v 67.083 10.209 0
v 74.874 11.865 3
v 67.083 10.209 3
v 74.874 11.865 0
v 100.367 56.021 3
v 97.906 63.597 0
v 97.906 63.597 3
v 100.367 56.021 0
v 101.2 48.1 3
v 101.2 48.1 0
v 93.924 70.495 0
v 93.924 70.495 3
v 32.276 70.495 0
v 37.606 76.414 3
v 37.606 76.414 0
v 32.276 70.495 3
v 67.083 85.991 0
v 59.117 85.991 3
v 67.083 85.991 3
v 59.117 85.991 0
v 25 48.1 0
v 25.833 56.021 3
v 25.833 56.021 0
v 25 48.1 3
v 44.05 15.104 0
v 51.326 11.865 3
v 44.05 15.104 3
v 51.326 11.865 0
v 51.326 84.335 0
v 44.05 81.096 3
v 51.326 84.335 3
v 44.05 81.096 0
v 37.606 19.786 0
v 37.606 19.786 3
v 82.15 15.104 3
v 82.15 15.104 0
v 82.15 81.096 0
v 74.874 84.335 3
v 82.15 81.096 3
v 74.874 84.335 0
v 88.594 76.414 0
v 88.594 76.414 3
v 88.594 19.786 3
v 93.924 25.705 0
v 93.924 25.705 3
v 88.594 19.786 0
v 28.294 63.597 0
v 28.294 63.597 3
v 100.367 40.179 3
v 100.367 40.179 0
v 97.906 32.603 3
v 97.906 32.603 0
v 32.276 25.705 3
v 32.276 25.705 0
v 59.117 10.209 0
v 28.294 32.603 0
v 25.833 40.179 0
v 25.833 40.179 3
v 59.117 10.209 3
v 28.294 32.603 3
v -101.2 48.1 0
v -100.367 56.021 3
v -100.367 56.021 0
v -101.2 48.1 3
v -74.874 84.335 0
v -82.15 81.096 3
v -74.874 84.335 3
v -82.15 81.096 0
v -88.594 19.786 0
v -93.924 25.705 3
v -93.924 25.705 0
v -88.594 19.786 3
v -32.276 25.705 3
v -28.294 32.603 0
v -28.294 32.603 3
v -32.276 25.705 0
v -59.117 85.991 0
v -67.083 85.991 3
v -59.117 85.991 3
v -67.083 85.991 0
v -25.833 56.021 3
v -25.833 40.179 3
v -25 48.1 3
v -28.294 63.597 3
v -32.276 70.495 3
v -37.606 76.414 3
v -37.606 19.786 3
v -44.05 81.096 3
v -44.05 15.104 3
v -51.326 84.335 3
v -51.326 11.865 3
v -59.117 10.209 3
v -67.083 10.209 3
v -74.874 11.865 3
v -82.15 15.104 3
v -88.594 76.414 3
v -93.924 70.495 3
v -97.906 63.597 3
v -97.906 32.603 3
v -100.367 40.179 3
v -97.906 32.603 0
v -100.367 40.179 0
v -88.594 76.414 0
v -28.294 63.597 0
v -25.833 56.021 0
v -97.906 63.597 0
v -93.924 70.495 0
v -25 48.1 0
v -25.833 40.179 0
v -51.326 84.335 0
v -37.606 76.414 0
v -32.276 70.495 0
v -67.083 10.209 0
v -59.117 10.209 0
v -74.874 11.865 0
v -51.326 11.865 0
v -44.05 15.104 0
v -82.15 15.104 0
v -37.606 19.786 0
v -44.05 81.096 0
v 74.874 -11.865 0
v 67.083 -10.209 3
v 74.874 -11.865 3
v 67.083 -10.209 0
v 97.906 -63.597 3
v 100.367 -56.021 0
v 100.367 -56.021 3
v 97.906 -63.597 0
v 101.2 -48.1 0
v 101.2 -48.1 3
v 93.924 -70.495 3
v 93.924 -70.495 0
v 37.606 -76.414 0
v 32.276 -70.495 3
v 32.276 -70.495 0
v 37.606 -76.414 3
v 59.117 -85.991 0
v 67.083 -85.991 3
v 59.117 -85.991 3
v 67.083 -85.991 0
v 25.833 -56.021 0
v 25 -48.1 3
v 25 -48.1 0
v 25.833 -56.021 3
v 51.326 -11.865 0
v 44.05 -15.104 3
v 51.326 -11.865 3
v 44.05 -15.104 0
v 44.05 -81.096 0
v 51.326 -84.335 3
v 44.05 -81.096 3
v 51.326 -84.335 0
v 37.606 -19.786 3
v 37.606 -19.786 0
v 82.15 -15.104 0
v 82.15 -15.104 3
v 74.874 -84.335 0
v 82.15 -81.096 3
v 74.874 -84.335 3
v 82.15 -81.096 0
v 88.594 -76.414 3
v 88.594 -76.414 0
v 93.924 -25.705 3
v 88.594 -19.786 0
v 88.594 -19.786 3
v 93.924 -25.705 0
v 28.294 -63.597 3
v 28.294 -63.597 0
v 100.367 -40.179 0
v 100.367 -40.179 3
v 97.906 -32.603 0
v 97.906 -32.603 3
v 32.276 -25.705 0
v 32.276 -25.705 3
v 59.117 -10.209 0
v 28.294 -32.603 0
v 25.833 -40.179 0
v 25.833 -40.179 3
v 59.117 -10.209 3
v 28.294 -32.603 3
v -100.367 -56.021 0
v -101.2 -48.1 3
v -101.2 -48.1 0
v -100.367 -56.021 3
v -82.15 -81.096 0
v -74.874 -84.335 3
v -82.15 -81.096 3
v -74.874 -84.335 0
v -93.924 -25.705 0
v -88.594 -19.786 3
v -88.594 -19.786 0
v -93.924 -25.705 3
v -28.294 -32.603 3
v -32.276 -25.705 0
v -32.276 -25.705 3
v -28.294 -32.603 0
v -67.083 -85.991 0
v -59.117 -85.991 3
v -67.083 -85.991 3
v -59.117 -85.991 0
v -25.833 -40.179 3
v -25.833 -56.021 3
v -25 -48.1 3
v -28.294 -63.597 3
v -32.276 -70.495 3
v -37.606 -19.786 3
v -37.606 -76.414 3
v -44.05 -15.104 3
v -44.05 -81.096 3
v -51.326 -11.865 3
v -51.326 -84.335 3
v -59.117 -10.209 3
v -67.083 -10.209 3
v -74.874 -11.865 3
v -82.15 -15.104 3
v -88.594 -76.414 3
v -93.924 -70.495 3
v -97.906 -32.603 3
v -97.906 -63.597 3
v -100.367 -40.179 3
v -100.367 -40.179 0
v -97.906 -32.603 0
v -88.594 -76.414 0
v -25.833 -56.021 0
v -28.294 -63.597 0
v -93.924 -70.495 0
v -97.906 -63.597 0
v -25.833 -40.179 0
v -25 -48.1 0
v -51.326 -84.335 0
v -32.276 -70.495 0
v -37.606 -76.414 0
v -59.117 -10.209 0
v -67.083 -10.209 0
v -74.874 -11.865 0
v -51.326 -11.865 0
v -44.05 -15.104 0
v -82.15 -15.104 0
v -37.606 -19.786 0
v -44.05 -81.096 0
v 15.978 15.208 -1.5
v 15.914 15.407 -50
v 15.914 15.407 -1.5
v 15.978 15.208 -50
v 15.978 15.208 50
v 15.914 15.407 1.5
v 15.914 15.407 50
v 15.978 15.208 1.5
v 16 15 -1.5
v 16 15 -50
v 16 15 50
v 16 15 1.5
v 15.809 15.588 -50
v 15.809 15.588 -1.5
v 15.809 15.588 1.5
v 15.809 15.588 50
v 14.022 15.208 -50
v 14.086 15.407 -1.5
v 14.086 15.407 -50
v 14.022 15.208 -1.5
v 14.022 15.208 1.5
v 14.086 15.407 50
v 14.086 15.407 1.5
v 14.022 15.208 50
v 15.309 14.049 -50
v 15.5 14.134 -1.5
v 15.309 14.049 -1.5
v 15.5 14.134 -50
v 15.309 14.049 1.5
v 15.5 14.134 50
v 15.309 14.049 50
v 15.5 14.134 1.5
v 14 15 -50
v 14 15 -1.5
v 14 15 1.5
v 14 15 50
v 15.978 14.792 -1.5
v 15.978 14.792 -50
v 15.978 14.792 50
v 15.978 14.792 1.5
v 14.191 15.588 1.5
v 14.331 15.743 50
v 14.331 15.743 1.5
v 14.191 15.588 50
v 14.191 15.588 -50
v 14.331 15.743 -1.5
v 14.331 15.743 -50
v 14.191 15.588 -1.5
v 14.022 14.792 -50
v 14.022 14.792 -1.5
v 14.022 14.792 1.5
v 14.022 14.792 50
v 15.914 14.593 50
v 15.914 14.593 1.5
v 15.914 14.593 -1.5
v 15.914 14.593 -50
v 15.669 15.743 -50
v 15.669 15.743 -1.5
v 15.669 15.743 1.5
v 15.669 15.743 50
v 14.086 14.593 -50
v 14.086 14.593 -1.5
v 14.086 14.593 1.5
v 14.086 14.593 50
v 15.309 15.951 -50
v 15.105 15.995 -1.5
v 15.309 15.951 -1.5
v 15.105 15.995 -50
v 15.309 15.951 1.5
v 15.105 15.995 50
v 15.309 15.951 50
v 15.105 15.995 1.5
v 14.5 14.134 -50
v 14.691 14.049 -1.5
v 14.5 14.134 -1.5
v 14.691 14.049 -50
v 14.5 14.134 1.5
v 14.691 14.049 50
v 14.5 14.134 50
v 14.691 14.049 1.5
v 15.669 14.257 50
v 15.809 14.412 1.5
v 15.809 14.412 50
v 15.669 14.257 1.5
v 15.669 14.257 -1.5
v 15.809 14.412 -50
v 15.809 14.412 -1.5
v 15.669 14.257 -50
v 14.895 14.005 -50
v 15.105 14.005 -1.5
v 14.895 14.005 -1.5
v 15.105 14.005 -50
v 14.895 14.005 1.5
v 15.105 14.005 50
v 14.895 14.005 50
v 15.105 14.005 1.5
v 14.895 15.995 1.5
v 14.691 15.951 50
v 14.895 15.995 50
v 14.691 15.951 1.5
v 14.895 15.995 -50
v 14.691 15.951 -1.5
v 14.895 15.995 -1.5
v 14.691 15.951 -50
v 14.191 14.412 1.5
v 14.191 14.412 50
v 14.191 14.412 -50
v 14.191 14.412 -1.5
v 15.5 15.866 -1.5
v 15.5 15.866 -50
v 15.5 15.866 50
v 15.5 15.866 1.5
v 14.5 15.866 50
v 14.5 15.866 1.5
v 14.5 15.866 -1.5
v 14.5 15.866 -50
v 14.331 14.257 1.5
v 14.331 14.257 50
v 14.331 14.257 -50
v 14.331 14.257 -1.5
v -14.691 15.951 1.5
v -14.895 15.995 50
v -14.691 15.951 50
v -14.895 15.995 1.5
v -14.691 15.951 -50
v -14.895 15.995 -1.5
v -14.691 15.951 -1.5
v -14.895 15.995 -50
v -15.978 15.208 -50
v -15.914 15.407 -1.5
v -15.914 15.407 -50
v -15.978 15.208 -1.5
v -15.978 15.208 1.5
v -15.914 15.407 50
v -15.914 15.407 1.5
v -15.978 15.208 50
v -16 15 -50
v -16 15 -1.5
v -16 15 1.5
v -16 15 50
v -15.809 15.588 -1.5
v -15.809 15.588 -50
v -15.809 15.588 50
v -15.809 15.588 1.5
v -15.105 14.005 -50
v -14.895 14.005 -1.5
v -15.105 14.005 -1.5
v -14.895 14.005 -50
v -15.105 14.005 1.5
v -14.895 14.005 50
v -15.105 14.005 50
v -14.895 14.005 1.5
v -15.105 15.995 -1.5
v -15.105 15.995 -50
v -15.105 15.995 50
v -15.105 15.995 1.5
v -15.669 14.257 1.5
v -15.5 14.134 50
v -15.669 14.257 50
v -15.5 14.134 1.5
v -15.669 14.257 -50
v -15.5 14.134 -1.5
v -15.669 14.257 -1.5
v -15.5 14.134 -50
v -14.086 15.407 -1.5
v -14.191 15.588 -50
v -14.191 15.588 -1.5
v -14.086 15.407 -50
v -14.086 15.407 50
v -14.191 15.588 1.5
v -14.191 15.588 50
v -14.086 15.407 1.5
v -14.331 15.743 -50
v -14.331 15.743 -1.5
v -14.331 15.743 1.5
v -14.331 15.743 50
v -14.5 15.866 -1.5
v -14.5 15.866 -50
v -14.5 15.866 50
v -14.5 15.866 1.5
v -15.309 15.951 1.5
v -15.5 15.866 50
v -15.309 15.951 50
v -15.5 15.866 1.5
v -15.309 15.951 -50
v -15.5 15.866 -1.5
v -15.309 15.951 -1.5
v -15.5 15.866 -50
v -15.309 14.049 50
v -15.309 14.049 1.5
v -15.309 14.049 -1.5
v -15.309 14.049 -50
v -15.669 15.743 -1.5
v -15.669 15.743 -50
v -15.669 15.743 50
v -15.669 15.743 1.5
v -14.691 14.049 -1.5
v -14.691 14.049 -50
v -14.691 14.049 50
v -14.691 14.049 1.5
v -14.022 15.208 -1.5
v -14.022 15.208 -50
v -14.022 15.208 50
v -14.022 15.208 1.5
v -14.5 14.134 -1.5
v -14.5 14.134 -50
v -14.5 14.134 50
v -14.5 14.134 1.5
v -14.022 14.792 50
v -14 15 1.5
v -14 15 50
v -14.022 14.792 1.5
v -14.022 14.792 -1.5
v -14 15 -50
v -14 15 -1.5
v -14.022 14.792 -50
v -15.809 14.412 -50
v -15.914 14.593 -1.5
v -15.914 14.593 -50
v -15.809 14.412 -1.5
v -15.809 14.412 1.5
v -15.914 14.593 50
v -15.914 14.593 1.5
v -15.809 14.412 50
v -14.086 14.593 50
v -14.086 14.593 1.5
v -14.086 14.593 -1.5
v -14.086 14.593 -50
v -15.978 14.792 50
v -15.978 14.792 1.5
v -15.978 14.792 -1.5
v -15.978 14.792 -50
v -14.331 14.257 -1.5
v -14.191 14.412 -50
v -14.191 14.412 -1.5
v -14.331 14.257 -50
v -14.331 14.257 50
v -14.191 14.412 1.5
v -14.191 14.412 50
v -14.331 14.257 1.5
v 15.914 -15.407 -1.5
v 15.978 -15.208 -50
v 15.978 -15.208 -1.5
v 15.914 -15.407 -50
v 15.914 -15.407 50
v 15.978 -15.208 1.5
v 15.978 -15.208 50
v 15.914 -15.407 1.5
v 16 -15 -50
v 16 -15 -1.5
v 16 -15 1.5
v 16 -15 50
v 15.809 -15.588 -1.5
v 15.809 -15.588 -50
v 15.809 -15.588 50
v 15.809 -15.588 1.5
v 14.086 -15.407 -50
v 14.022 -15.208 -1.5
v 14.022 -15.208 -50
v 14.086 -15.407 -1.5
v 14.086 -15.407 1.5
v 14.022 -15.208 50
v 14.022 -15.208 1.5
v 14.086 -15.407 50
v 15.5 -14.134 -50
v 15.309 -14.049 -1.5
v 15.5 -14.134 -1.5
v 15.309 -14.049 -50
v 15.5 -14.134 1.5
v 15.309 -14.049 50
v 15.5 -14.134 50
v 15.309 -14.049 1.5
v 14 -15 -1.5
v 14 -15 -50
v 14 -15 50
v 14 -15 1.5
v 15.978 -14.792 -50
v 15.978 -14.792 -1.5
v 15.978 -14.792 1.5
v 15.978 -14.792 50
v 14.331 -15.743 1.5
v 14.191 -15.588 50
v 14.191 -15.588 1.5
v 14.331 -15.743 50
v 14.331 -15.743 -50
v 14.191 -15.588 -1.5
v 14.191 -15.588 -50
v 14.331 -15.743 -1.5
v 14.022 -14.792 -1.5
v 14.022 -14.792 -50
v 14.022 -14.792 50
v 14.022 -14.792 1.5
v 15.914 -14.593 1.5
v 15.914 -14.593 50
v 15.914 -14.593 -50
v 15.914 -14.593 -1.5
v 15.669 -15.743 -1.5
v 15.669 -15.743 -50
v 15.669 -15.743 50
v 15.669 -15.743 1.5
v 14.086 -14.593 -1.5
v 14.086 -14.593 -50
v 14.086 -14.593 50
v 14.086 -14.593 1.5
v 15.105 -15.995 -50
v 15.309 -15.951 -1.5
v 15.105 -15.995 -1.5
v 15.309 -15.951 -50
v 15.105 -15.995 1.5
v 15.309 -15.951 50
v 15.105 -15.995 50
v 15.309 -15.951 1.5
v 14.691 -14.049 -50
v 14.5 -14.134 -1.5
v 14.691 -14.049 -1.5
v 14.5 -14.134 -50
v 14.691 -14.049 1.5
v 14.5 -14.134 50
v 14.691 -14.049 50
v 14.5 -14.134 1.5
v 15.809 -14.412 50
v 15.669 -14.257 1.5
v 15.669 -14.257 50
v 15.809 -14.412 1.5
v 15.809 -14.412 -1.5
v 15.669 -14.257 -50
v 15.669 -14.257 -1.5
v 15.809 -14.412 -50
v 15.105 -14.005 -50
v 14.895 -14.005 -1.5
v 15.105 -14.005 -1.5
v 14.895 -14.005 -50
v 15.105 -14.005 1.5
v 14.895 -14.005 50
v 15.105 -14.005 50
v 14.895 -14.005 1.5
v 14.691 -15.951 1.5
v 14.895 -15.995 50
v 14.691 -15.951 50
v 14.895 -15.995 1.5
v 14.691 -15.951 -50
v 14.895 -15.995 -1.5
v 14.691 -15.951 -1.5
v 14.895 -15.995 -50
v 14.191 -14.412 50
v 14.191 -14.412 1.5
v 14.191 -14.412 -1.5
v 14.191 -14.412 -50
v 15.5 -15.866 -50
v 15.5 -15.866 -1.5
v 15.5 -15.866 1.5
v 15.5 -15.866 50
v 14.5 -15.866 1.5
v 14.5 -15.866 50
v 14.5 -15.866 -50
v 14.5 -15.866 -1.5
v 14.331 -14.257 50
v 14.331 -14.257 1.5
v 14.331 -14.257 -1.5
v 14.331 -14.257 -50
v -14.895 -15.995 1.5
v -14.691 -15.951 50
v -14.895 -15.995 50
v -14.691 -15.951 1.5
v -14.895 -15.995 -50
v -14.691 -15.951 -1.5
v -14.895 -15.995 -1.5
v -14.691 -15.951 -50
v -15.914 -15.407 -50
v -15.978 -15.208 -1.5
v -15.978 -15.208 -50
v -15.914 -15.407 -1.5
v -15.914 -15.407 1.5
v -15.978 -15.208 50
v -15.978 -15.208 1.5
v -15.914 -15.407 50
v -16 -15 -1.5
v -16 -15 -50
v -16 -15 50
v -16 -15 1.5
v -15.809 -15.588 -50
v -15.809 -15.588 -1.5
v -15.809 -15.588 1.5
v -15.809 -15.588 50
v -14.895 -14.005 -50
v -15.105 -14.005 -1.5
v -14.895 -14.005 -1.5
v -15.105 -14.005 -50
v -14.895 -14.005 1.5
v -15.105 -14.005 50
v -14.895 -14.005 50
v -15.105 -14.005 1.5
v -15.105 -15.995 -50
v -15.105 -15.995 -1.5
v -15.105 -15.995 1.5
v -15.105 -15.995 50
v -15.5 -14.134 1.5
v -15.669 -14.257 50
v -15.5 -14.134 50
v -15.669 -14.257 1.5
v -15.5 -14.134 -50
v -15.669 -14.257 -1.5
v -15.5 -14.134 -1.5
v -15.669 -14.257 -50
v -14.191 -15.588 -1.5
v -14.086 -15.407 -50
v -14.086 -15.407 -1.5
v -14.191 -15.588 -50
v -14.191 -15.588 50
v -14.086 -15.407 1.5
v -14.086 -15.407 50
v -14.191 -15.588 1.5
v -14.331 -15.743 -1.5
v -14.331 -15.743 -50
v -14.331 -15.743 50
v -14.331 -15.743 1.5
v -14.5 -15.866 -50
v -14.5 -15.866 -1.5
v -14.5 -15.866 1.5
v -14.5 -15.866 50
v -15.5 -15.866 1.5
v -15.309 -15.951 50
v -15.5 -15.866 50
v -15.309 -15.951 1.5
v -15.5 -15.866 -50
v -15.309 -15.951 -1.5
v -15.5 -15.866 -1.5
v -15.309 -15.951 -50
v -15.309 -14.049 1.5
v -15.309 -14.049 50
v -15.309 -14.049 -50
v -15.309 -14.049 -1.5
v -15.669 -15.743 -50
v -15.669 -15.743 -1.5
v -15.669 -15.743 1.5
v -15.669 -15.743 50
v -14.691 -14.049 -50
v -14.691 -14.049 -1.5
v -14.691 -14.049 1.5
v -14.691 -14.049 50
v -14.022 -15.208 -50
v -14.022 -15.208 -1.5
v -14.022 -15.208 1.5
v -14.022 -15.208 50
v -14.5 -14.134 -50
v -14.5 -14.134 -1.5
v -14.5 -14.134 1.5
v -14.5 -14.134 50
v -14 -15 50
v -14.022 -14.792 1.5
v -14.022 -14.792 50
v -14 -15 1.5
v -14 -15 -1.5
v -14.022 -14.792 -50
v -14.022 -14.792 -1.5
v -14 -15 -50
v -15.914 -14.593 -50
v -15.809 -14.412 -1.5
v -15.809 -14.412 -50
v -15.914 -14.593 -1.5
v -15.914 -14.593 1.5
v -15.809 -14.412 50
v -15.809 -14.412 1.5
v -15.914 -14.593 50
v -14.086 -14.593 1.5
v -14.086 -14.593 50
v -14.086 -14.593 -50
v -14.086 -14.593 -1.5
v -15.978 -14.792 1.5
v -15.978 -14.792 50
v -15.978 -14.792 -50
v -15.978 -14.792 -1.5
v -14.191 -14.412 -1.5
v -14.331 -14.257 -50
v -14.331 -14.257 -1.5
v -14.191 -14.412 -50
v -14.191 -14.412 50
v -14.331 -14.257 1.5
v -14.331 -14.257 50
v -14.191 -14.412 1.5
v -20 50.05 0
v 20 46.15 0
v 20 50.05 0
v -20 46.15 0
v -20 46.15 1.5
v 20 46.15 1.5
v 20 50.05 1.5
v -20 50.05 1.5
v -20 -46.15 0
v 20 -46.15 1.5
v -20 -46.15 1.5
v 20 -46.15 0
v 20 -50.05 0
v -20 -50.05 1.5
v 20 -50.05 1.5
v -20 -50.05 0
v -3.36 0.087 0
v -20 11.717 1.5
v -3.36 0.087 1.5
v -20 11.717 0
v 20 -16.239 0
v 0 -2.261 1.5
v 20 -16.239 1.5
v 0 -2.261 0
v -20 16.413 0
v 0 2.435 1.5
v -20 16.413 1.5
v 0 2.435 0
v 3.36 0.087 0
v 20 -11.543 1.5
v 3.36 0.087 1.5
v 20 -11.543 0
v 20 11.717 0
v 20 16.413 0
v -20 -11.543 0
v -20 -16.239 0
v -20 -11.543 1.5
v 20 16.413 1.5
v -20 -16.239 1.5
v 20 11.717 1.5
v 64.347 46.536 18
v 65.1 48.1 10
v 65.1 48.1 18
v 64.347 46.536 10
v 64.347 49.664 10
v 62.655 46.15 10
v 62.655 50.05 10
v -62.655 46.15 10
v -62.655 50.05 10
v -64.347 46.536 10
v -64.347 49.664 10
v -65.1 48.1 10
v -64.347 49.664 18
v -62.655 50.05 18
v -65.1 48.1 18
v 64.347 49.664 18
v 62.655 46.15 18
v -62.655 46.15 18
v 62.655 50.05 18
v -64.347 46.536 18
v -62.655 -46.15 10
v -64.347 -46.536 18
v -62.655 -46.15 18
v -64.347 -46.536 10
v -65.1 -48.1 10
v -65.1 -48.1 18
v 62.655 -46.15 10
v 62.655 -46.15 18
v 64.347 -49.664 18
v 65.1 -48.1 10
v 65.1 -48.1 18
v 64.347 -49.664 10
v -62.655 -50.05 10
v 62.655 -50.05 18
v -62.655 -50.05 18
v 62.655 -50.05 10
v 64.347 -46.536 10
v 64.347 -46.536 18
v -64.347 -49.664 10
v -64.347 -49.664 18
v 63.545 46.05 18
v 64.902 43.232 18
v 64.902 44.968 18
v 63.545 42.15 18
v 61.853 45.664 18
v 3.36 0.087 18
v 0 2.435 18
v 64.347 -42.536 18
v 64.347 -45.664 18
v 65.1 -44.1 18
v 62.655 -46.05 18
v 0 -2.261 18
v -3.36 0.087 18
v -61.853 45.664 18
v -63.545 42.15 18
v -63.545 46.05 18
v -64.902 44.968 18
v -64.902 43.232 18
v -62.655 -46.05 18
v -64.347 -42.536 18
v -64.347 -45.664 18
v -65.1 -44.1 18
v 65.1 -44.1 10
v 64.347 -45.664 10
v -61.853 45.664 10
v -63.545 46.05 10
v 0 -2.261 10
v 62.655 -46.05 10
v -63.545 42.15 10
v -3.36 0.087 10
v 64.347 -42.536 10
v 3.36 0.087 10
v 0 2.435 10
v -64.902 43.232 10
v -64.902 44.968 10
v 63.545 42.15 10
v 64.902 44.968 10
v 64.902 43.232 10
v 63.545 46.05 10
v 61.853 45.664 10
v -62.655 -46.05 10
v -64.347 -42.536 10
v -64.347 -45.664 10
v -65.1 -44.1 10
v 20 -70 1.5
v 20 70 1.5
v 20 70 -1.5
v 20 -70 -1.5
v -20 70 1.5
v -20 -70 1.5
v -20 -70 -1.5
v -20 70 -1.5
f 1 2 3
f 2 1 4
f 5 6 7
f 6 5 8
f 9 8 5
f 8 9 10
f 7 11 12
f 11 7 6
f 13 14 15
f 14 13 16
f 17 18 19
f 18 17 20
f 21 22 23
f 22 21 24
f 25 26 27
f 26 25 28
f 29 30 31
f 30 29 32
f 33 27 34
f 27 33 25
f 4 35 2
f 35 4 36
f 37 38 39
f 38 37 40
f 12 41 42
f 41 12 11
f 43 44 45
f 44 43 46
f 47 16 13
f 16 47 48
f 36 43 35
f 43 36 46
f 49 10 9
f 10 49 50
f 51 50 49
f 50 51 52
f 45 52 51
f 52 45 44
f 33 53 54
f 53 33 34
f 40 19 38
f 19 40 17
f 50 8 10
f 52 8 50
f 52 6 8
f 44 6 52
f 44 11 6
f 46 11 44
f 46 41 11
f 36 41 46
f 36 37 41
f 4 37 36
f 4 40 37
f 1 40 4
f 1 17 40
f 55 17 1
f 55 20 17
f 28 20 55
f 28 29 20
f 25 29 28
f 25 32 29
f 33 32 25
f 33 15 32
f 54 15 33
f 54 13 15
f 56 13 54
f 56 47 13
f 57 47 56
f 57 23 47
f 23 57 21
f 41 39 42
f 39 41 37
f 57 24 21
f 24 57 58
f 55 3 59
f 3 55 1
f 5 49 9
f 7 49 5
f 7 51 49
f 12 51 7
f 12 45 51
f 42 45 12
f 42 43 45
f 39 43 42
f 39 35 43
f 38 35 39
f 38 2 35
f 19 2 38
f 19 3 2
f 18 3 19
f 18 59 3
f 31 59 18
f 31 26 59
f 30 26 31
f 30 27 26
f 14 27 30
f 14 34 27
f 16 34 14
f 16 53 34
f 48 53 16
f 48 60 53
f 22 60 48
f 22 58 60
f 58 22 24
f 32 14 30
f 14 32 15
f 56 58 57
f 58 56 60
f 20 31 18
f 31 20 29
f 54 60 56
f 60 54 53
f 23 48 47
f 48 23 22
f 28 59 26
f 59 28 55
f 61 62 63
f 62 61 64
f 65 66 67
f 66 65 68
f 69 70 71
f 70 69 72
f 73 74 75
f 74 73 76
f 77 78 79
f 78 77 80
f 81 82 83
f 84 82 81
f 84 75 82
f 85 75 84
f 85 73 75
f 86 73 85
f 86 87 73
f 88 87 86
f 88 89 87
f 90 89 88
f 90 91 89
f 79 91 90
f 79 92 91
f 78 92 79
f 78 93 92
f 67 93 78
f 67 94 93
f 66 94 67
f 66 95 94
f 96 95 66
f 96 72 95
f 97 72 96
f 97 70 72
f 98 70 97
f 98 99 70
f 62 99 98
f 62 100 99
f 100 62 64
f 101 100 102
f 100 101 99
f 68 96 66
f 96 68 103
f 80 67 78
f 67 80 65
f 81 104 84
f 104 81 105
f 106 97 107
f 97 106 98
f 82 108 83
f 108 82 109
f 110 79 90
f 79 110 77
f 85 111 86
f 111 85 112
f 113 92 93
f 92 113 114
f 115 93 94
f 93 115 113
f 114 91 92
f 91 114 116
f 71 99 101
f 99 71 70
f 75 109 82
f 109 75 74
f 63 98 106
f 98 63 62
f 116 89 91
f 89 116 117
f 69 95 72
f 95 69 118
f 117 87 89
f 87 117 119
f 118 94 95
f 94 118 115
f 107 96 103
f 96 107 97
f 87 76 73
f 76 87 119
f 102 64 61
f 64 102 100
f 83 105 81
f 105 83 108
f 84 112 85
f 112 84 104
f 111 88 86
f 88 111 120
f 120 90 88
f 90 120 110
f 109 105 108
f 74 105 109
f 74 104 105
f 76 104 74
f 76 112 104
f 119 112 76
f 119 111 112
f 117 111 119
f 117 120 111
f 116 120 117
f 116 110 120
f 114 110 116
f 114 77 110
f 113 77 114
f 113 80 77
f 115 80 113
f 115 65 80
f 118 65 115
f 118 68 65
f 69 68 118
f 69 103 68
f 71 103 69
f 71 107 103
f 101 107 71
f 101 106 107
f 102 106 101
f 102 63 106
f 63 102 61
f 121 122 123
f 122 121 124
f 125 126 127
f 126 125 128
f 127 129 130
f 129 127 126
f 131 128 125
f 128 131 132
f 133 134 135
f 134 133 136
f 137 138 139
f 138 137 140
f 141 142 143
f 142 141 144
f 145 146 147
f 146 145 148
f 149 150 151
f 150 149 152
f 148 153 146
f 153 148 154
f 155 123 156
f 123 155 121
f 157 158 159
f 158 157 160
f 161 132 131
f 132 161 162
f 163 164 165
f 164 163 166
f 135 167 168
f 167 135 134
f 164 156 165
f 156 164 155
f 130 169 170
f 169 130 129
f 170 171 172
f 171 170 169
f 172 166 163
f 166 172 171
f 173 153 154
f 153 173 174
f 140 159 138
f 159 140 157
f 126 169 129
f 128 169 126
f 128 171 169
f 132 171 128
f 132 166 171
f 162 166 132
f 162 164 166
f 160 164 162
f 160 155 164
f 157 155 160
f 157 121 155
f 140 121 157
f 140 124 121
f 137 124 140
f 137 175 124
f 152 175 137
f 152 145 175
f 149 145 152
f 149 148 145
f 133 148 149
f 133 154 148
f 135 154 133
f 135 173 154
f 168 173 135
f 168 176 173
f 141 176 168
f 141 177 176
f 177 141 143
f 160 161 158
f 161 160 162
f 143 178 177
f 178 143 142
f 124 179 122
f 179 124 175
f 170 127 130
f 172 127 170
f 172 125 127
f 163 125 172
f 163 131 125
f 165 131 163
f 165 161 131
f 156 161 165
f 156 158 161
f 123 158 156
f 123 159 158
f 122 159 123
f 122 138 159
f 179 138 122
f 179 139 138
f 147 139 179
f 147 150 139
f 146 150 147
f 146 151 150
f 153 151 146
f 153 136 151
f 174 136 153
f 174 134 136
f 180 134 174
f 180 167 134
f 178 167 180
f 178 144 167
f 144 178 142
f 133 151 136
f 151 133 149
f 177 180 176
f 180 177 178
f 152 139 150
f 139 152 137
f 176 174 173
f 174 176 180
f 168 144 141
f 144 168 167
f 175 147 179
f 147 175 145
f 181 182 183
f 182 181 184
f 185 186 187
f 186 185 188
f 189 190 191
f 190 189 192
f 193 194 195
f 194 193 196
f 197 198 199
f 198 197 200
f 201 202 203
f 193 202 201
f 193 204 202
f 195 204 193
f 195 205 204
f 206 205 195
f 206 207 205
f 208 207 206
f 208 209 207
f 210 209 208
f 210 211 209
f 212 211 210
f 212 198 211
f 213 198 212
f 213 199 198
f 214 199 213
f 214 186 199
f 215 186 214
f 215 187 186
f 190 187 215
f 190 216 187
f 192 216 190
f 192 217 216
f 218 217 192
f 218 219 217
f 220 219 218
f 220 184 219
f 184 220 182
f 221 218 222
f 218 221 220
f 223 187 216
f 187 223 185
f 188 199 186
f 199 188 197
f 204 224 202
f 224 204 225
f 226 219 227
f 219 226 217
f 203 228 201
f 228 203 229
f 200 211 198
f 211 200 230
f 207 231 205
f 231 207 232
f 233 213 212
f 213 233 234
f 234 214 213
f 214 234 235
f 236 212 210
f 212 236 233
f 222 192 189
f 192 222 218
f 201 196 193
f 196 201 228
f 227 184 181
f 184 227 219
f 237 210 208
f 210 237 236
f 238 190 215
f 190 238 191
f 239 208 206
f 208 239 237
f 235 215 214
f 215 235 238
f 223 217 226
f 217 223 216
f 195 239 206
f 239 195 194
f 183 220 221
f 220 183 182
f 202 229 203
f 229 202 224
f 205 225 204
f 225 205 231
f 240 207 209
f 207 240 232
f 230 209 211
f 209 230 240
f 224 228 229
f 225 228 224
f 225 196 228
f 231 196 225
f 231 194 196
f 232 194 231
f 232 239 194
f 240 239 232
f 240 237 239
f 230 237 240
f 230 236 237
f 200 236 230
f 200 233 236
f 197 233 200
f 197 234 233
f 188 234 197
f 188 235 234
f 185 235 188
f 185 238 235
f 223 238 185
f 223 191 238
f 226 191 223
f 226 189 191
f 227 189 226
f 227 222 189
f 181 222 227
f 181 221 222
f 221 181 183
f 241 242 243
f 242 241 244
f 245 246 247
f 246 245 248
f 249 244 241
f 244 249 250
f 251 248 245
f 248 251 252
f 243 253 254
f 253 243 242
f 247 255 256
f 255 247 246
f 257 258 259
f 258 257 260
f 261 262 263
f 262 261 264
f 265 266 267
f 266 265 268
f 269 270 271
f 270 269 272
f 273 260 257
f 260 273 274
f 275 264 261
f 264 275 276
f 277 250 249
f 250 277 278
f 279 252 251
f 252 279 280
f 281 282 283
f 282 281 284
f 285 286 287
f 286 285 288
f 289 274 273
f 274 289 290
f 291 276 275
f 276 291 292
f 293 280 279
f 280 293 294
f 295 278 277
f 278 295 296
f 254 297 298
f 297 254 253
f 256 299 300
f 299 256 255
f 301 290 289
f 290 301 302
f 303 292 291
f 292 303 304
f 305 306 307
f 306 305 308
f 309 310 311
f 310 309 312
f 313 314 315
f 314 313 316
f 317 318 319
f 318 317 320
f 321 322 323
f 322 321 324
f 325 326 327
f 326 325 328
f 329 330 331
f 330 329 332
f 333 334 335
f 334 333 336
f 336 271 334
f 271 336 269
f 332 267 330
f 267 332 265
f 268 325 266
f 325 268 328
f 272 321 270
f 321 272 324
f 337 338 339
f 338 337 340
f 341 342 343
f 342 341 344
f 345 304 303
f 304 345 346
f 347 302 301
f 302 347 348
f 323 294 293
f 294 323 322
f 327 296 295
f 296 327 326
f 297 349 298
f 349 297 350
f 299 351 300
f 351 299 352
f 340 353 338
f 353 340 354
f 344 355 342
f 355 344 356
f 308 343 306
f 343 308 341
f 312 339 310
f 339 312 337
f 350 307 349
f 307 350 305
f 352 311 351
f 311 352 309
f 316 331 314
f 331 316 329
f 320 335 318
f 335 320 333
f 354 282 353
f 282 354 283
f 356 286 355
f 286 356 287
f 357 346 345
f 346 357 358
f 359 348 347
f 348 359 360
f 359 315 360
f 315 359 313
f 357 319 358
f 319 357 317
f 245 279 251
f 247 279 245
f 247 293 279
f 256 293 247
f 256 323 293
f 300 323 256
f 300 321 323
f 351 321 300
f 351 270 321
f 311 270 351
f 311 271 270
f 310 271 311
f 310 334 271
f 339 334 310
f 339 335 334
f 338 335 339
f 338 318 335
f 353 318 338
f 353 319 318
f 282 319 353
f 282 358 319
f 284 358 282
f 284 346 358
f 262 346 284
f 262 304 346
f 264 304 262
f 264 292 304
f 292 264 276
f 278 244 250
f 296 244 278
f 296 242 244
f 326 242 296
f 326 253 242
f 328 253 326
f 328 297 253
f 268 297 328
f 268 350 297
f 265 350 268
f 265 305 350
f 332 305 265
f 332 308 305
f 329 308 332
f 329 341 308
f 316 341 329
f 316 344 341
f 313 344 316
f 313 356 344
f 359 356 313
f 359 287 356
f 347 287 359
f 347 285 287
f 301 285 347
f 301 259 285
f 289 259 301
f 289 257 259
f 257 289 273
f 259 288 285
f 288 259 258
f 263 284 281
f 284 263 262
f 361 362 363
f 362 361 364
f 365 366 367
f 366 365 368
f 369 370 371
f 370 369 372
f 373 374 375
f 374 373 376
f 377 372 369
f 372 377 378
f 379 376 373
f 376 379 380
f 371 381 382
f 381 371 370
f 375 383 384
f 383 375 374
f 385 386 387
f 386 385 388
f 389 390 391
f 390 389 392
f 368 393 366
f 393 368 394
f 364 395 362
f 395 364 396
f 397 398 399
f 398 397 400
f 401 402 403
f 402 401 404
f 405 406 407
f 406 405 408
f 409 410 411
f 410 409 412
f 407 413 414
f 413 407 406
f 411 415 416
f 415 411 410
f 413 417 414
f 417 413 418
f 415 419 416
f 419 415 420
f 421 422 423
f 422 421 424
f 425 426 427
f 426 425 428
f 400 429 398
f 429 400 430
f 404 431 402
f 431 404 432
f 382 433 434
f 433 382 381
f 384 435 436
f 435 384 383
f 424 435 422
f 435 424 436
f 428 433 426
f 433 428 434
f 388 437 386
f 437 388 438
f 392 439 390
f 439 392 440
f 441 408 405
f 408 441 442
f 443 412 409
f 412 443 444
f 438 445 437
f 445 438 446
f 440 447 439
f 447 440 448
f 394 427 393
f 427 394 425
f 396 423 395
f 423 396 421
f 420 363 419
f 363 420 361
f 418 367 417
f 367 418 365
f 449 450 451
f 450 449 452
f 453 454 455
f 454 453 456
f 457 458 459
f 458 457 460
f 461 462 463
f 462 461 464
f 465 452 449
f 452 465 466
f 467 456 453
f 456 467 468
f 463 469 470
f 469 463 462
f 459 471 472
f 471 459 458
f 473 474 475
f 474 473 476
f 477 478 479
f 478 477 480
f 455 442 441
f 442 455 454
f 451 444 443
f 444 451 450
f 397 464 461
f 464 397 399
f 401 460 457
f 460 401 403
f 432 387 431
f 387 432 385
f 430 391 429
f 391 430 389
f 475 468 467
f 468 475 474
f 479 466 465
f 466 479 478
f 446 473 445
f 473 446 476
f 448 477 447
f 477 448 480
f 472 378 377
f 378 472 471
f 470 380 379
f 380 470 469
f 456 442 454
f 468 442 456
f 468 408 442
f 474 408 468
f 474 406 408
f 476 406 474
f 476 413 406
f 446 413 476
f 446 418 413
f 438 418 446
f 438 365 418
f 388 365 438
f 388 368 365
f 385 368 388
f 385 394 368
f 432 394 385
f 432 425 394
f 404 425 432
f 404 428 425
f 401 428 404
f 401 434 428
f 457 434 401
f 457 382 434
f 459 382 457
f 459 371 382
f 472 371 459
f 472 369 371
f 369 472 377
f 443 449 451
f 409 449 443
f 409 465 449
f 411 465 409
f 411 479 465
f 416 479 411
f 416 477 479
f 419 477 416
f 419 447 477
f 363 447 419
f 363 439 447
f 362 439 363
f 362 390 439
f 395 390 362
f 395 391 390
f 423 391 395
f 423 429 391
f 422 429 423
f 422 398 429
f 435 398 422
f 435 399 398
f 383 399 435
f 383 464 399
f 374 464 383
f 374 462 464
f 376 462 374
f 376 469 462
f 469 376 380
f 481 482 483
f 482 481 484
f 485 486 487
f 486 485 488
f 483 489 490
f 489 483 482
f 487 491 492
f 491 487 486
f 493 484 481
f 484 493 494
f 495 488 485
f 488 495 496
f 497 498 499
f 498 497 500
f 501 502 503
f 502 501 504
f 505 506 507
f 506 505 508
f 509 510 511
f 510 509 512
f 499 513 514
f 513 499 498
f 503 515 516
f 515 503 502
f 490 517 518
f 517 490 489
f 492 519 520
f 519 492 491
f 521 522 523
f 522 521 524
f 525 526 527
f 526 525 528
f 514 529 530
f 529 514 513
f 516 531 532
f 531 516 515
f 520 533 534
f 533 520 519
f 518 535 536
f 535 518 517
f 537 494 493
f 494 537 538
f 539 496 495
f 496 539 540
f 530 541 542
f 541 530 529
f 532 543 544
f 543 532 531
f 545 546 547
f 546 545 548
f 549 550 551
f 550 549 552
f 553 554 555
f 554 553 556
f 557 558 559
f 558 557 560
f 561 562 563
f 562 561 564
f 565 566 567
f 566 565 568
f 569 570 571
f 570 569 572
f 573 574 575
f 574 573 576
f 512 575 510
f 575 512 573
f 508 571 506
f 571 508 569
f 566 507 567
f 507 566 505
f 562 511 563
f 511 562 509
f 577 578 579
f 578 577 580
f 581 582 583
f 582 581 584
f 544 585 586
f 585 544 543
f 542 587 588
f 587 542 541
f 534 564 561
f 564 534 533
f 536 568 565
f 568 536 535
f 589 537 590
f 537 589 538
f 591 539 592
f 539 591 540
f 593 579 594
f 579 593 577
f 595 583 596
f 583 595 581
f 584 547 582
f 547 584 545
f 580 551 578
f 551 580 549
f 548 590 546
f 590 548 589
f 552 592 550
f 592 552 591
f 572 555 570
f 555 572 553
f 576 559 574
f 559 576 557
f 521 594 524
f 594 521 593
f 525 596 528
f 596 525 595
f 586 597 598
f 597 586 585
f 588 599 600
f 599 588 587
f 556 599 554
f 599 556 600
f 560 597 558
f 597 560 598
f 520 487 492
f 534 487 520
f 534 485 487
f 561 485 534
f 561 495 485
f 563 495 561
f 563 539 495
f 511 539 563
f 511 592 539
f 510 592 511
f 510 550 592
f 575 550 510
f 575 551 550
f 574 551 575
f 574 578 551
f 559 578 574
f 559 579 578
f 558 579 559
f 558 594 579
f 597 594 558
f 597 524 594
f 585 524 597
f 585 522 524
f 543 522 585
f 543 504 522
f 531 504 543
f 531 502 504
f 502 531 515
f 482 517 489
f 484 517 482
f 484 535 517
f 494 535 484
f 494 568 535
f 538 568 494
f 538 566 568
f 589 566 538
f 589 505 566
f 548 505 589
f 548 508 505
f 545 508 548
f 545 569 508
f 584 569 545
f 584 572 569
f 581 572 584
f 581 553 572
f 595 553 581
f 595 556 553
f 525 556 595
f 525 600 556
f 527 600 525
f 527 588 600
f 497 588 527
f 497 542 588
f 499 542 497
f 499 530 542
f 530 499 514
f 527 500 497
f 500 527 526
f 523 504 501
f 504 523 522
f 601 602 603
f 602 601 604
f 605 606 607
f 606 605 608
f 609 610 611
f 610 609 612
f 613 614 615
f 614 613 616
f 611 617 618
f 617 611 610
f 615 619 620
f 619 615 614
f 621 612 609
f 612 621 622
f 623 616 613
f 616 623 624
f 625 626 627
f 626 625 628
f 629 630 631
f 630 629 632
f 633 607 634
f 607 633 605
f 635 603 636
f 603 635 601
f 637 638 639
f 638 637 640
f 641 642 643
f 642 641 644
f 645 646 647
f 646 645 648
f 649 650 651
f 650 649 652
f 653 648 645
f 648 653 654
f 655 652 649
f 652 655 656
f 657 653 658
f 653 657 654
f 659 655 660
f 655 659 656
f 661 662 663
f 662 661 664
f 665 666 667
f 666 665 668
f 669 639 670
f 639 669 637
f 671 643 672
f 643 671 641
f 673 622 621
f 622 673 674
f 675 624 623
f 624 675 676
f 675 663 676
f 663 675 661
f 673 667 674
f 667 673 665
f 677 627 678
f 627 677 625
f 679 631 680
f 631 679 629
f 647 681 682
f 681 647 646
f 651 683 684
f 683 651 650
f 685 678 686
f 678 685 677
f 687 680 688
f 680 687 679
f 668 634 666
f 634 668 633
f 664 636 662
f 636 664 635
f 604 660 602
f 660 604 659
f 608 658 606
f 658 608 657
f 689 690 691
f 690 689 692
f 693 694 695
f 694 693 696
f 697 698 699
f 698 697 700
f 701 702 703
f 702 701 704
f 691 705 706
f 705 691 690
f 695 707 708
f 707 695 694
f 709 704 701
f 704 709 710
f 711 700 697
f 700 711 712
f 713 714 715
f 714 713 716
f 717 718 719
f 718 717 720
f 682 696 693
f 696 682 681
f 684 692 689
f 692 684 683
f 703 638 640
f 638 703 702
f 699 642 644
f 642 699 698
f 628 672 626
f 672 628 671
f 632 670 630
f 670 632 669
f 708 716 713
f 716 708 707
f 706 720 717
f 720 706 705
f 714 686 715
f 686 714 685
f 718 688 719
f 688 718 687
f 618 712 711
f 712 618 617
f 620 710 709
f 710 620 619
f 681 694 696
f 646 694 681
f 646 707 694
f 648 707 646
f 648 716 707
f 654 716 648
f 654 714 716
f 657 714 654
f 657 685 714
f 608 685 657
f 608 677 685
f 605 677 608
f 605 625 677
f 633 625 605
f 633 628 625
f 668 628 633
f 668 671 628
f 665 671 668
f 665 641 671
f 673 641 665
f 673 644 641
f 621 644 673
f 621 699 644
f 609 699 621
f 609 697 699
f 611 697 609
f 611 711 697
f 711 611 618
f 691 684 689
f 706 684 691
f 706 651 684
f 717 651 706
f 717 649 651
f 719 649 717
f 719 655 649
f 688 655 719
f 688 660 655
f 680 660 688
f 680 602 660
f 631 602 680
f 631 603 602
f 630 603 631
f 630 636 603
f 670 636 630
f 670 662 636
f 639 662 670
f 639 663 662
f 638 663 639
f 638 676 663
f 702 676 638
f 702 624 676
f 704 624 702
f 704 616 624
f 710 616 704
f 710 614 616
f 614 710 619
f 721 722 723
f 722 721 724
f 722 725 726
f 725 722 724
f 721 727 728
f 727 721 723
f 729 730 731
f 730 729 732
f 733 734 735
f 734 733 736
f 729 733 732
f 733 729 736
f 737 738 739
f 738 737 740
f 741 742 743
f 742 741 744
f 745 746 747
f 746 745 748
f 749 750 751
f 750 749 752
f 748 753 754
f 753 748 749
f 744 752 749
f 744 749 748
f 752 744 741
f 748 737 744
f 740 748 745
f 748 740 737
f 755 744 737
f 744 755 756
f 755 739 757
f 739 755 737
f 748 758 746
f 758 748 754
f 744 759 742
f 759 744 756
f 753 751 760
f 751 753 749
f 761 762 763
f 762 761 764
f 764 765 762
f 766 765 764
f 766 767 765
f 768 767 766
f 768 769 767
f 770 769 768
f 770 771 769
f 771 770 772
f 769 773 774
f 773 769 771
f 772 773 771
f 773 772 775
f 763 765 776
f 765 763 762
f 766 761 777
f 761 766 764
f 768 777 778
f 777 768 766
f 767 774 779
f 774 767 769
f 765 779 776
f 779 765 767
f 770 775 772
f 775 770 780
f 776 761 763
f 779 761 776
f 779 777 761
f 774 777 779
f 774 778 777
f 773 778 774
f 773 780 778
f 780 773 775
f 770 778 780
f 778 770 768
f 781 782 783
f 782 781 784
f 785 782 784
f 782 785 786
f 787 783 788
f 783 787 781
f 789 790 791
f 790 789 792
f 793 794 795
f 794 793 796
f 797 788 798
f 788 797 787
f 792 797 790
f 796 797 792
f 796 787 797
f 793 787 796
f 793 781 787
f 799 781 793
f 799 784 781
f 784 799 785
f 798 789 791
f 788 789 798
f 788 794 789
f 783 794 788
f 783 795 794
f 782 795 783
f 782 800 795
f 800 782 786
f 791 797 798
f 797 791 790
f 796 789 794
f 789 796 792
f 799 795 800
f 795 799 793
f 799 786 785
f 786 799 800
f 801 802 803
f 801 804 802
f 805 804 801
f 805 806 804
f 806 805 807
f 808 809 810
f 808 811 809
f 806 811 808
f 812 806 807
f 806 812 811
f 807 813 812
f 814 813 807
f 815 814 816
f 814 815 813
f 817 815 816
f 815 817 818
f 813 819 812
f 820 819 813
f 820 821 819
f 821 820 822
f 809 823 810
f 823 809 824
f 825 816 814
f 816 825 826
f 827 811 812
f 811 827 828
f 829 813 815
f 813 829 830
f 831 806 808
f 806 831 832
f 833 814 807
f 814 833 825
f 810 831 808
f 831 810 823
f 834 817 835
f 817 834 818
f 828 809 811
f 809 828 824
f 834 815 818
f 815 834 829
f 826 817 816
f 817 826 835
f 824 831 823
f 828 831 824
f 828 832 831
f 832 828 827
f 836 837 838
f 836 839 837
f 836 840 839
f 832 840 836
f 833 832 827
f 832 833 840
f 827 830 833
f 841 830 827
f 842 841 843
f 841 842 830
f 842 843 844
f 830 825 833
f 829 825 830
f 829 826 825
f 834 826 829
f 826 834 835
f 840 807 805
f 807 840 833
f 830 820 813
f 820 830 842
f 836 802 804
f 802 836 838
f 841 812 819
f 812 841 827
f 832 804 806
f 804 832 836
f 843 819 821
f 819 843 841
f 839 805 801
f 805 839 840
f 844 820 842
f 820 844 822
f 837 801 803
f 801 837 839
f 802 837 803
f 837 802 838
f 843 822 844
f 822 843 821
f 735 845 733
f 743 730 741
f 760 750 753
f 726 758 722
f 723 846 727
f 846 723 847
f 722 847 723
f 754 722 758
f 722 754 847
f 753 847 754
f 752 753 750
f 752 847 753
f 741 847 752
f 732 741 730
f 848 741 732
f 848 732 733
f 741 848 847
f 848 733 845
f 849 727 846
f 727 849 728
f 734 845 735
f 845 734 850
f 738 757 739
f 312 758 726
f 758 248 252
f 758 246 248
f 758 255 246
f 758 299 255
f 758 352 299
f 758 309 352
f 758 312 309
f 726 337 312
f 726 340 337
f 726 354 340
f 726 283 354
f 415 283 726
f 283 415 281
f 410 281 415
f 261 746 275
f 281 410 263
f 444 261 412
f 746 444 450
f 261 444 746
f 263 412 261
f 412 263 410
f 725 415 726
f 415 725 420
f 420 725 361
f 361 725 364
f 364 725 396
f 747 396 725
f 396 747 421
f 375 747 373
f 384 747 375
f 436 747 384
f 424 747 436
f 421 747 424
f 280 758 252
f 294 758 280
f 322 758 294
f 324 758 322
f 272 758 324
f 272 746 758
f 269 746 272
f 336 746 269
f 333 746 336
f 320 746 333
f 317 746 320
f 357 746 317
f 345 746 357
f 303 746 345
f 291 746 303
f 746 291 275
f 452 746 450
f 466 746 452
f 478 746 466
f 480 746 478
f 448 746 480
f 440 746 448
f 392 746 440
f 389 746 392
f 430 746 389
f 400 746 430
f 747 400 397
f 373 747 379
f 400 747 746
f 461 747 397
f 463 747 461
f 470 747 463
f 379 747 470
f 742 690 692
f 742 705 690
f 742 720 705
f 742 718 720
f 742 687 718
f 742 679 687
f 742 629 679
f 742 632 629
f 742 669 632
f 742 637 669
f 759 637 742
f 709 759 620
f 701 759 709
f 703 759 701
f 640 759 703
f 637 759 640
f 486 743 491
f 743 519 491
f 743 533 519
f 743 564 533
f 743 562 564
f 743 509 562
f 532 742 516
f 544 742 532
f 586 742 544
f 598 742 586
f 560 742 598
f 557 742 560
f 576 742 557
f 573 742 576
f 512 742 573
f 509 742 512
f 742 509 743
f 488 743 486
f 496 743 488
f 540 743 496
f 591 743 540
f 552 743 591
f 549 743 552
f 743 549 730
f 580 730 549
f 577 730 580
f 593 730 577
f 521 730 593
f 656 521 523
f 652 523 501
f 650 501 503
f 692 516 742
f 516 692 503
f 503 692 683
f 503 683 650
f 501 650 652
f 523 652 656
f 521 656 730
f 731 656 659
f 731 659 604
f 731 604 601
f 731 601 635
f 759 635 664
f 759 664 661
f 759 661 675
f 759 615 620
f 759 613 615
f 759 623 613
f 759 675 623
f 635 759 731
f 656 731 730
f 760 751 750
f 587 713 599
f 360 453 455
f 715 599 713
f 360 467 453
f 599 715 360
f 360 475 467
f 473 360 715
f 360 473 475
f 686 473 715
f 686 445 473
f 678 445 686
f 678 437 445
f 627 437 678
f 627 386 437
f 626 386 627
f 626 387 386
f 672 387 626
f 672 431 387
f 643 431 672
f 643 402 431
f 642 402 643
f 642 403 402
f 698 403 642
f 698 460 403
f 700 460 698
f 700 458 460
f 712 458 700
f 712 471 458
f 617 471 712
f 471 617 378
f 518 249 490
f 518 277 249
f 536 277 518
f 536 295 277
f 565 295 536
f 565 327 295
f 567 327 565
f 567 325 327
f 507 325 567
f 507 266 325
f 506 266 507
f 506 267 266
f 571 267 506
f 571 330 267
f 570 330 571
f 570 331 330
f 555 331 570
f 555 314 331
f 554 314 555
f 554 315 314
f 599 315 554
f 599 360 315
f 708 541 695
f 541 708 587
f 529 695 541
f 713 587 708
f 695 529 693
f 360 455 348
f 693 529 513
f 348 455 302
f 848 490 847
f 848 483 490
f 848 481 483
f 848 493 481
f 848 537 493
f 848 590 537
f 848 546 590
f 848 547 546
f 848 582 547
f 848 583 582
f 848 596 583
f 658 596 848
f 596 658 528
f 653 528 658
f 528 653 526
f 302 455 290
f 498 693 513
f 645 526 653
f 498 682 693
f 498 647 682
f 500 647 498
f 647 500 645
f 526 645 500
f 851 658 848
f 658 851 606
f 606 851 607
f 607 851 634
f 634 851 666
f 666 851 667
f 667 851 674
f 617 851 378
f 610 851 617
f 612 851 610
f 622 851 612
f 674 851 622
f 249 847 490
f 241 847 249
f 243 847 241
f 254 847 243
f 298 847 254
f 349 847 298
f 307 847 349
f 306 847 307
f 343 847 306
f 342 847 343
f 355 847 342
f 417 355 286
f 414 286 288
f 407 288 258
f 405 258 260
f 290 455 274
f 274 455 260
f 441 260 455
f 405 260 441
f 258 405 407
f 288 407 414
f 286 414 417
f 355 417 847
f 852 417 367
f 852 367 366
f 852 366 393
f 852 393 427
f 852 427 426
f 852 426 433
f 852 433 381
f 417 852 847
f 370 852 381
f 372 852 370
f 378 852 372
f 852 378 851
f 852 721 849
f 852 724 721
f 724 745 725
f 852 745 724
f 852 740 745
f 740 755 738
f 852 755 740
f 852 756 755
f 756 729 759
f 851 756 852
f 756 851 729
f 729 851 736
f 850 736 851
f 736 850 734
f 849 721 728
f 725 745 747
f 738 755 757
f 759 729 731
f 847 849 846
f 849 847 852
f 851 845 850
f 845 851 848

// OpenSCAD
// file: utils.scad
module part(name) {
    echo(len(search(name, PART)));
    if (PART == undef || PART == name) {
        children([0 : $children -1]);
    }
    else {
        if (PART_ONLY == undef) {
            %children([0 : $children -1]);
        }
    }
}

module partno(name, r=0,g=1,b=1) {
    if (PART_ONLY == undef) {
        color([r,g,b]) {
            if (PART == undef || PART == name) {
                %children([0 : $children -1]);
            }
            else {
                %children([0 : $children -1]);
            }
        }
    }
}

module kube(x,y,z) {
    cube([x,y,z], center=true);
}

module mv(x, y, z) {
    translate([x,y,z]) {
        children([0 : $children -1]);

   }
}

module rot(x, y, z) {
    rotate([x,y,z]) {
        children([0 : $children -1]);
   }
}

module rez(x, y, z) {
    scale([x,y,z]) {
        children([0 : $children]);
   }
}

module co(r,g,b) {
    color([r,g,b]) {
        children([0 : $children]);
   }
}

module trans() {
    %children();
}

module hash() {
    #children();
}

module fidt() {
    children(0);
    render(convexity = 2) difference() {
        trans()
        children(1);
        hash()
        children(0);
   }
}

module fid() {
    render(convexity = 2) difference() {
        children(1);
        children(0);
   }
}

module int() {
    render(convexity = 2) intersection() {
        children(0);
        children(1);
   }
}

module dif() {
    render(convexity = 2) difference() {
        children(0);
        children(1);
   }
}

module dift() {
    children(1);
    render(convexity = 2) difference() {
        trans()
        children(0);
        hash()
        children(1);
   }
}

module mirrot(x, y ,z) {
    children(0);
    rotate([x, y, z]) {
        children(0);
    }
}

module mirx() {
    children([0:$children-1]);
    mirror([1,0,0]) {
        children([0:$children-1]);
   }
}

module miry() {
    children([0:$children-1]);
    mirror([0,1,0]) {
        children([0:$children-1]);
   }
}

module mxm(dist) {
    mirx() mv(dist,0,0)
    children([0:$children-1]);
}

module mym(dist) {
    miry() mv(0,dist,0)
    children([0:$children-1]);
}

module mirz() {
    children([0:$children-1]);
    mirror([0,0,1]) {
        children([0:$children-1]);
   }
}

module dif3() {
    dif() {
        dif() {
            children(0);
            children(1);
        }
        children(2);
    }
}

module dif4() {
    dif() {
        dif3() {
            children(0);
            children(1);
            children(2);
        }
        children(3);
    }
}

function inch_mm(x) = x*25.4;

function mm_inch(x) = x/25.4;
// main file
include<utils.scad>

module prop3(){
    cylinder(h=3,d=inch_mm(3));
}

x_body=38;
y_spacement=20/2+inch_mm(3/2);
x_spacement=(x_body+12)/2+inch_mm(3/2);

mym(y_spacement)
mxm(x_spacement)
prop3();

module arms() {
    mym(y_spacement)
    hull()
    mxm(x_spacement)
    cylinder(h=8, d=4);

    mirx()
    hull() {
    mv(-x_spacement, y_spacement-4, 0)
    cylinder(h=8, d=4);
    mv(x_spacement, -y_spacement+4, 0)
    cylinder(h=8, d=4);
    }
}

module mounting_hole() {
    mym(30/2)
    mxm(30/2)
    cylinder(h=100,d=2, center=true, $fn=30);
}

mounting_hole();

color([1,0,0])
mv(0,0,10)
arms();

dif() {
cube([40,140,3], center=true);
arms();
}
